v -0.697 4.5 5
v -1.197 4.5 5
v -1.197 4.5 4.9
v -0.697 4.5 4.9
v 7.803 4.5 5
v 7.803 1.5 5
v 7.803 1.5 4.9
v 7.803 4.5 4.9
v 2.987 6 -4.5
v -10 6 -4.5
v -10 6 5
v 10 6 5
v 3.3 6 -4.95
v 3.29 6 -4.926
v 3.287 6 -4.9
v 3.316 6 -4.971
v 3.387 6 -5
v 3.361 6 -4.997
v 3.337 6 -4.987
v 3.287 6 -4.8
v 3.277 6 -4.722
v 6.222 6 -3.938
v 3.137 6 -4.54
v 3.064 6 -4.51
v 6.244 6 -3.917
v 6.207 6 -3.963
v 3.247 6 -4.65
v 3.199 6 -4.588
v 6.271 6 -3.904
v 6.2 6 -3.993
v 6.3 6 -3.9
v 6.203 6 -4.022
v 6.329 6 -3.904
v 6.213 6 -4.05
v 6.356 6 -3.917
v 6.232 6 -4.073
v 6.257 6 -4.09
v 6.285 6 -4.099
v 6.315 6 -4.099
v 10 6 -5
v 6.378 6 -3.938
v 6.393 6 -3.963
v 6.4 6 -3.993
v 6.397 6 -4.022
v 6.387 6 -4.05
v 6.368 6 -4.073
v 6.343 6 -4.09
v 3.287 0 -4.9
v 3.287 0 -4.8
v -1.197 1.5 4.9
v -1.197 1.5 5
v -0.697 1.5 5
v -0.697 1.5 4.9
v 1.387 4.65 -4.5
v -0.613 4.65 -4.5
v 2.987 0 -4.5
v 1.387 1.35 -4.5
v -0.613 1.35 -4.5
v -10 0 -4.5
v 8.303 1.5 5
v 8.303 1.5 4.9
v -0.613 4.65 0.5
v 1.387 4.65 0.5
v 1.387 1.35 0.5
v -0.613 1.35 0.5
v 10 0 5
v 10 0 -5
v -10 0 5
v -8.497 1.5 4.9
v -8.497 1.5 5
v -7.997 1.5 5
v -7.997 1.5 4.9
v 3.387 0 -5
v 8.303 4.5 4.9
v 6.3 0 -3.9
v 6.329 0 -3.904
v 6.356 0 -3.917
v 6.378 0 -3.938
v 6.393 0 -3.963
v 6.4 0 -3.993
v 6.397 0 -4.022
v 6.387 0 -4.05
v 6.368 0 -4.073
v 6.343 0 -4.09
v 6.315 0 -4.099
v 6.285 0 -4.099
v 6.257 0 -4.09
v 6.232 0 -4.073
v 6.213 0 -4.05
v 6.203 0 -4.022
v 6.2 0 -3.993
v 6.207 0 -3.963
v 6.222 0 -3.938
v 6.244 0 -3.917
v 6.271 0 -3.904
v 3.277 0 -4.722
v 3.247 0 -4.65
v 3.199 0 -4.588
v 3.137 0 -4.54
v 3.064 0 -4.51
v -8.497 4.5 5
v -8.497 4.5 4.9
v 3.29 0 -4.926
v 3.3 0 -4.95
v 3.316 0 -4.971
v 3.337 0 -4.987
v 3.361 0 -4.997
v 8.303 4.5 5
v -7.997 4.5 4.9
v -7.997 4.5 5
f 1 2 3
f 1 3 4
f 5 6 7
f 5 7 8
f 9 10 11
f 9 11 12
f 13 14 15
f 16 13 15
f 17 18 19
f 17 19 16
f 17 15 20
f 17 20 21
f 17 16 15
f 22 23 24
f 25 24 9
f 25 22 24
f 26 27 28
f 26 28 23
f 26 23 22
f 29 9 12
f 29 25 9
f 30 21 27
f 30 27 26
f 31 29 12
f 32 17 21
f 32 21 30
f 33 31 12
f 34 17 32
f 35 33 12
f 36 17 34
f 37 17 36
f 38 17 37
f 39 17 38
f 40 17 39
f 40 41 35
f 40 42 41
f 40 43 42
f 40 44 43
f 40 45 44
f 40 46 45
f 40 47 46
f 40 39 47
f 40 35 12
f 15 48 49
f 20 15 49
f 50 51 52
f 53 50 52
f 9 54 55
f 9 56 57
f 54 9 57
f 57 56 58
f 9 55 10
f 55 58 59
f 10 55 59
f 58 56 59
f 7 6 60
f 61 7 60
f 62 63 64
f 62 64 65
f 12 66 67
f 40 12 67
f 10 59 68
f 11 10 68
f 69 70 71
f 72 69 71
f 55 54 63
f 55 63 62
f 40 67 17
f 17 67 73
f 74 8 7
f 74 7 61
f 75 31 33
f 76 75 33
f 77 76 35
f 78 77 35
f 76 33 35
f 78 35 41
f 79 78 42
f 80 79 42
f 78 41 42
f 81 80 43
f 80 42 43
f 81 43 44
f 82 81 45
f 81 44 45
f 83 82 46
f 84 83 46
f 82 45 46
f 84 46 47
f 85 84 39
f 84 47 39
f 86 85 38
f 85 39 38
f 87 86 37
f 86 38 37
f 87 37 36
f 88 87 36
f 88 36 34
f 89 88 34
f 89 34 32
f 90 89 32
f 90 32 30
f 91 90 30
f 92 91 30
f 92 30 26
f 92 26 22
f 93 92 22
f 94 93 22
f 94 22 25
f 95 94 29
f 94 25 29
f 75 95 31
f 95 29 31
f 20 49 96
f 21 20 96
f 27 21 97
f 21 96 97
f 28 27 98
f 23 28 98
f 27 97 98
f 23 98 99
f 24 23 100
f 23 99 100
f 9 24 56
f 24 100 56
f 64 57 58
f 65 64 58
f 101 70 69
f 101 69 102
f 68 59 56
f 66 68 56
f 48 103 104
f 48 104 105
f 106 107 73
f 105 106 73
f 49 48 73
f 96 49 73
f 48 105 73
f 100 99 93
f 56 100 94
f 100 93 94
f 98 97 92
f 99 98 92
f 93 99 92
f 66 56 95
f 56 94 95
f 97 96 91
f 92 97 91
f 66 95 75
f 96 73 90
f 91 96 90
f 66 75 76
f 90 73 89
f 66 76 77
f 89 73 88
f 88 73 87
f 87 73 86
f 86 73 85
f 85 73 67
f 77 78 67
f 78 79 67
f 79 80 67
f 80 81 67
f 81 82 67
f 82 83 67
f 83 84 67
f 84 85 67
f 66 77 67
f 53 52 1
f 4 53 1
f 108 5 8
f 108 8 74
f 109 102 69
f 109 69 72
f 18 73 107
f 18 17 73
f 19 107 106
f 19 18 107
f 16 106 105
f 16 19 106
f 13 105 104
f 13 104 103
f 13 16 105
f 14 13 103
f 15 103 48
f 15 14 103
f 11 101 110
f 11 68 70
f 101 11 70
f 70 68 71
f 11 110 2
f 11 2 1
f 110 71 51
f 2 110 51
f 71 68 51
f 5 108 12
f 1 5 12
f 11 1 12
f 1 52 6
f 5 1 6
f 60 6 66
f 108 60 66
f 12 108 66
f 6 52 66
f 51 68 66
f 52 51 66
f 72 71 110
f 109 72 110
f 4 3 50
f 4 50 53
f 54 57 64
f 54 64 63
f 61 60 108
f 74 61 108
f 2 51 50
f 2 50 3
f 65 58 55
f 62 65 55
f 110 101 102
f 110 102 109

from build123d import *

# Parameters (mm, degrees)
SALIENTE_EXTRUIR2_DEPTH = 6
REDONDEO1_R             = 0.1
CROQUIS3_W              = 2
CROQUIS3_H              = 3.3
CORTAR_EXTRUIR2_DEPTH   = 5
CROQUIS4_R              = 0.1
CORTAR_EXTRUIR3_DEPTH   = 6
CROQUIS5_W              = 0.5
CROQUIS5_H              = 3
CORTAR_EXTRUIR4_DEPTH   = 0.1


with BuildPart() as part:
    # Croquis1 → Saliente-Extruir2 (new body)
    with BuildSketch(Plane(origin=(0, 0, 0), x_dir=(1, 0, 0), z_dir=(0, 1, 0))):
        with BuildLine():
            Line((2.986733927, 4.5), (-10, 4.5))
            Line((-10, 4.5), (-10, -5))
            Line((-10, -5), (10, -5))
            Line((10, -5), (10, 5))
            Line((10, 5), (3.286733927, 5))
            Line((3.286733927, 5), (3.286733927, 4.8))
            ThreePointArc((3.286733927, 4.8), (3.198865961, 4.587867966), (2.986733927, 4.5))
        make_face()
    extrude(amount=SALIENTE_EXTRUIR2_DEPTH)

    # Redondeo1
    redondeo1_edges = [part.edges().sort_by_distance(p)[0] for p in [
        (3.286733927, 3, -5),
    ]]
    fillet(redondeo1_edges, radius=REDONDEO1_R)

    # Croquis3 → Cortar-Extruir2 (cut)
    with BuildSketch(Plane(origin=(0, 0, -4.5), x_dir=(-1, 0, 0), z_dir=(0, 0, -1))):
        with Locations((-0.386733927, 3)):
            Rectangle(CROQUIS3_W, CROQUIS3_H)
    extrude(amount=-CORTAR_EXTRUIR2_DEPTH, mode=Mode.SUBTRACT)

    # Croquis4 → Cortar-Extruir3 (cut)
    with BuildSketch(Plane(origin=(0, 6, 0), x_dir=(1, 0, 0), z_dir=(0, 1, 0))):
        with Locations(Location((6.3, 4, 0), (0, 0, 270))):
            Circle(CROQUIS4_R)
    extrude(amount=-CORTAR_EXTRUIR3_DEPTH, mode=Mode.SUBTRACT)

    # Croquis5 → Cortar-Extruir4 (cut)
    with BuildSketch(Plane.XY.offset(5)):
        with Locations((-8.247200411, 3)):
            Rectangle(CROQUIS5_W, CROQUIS5_H)
        with Locations((-0.947200411, 3)):
            Rectangle(CROQUIS5_W, CROQUIS5_H)
        with Locations((8.052799589, 3)):
            Rectangle(CROQUIS5_W, CROQUIS5_H)
    extrude(amount=-CORTAR_EXTRUIR4_DEPTH, mode=Mode.SUBTRACT)


solid = part.part
